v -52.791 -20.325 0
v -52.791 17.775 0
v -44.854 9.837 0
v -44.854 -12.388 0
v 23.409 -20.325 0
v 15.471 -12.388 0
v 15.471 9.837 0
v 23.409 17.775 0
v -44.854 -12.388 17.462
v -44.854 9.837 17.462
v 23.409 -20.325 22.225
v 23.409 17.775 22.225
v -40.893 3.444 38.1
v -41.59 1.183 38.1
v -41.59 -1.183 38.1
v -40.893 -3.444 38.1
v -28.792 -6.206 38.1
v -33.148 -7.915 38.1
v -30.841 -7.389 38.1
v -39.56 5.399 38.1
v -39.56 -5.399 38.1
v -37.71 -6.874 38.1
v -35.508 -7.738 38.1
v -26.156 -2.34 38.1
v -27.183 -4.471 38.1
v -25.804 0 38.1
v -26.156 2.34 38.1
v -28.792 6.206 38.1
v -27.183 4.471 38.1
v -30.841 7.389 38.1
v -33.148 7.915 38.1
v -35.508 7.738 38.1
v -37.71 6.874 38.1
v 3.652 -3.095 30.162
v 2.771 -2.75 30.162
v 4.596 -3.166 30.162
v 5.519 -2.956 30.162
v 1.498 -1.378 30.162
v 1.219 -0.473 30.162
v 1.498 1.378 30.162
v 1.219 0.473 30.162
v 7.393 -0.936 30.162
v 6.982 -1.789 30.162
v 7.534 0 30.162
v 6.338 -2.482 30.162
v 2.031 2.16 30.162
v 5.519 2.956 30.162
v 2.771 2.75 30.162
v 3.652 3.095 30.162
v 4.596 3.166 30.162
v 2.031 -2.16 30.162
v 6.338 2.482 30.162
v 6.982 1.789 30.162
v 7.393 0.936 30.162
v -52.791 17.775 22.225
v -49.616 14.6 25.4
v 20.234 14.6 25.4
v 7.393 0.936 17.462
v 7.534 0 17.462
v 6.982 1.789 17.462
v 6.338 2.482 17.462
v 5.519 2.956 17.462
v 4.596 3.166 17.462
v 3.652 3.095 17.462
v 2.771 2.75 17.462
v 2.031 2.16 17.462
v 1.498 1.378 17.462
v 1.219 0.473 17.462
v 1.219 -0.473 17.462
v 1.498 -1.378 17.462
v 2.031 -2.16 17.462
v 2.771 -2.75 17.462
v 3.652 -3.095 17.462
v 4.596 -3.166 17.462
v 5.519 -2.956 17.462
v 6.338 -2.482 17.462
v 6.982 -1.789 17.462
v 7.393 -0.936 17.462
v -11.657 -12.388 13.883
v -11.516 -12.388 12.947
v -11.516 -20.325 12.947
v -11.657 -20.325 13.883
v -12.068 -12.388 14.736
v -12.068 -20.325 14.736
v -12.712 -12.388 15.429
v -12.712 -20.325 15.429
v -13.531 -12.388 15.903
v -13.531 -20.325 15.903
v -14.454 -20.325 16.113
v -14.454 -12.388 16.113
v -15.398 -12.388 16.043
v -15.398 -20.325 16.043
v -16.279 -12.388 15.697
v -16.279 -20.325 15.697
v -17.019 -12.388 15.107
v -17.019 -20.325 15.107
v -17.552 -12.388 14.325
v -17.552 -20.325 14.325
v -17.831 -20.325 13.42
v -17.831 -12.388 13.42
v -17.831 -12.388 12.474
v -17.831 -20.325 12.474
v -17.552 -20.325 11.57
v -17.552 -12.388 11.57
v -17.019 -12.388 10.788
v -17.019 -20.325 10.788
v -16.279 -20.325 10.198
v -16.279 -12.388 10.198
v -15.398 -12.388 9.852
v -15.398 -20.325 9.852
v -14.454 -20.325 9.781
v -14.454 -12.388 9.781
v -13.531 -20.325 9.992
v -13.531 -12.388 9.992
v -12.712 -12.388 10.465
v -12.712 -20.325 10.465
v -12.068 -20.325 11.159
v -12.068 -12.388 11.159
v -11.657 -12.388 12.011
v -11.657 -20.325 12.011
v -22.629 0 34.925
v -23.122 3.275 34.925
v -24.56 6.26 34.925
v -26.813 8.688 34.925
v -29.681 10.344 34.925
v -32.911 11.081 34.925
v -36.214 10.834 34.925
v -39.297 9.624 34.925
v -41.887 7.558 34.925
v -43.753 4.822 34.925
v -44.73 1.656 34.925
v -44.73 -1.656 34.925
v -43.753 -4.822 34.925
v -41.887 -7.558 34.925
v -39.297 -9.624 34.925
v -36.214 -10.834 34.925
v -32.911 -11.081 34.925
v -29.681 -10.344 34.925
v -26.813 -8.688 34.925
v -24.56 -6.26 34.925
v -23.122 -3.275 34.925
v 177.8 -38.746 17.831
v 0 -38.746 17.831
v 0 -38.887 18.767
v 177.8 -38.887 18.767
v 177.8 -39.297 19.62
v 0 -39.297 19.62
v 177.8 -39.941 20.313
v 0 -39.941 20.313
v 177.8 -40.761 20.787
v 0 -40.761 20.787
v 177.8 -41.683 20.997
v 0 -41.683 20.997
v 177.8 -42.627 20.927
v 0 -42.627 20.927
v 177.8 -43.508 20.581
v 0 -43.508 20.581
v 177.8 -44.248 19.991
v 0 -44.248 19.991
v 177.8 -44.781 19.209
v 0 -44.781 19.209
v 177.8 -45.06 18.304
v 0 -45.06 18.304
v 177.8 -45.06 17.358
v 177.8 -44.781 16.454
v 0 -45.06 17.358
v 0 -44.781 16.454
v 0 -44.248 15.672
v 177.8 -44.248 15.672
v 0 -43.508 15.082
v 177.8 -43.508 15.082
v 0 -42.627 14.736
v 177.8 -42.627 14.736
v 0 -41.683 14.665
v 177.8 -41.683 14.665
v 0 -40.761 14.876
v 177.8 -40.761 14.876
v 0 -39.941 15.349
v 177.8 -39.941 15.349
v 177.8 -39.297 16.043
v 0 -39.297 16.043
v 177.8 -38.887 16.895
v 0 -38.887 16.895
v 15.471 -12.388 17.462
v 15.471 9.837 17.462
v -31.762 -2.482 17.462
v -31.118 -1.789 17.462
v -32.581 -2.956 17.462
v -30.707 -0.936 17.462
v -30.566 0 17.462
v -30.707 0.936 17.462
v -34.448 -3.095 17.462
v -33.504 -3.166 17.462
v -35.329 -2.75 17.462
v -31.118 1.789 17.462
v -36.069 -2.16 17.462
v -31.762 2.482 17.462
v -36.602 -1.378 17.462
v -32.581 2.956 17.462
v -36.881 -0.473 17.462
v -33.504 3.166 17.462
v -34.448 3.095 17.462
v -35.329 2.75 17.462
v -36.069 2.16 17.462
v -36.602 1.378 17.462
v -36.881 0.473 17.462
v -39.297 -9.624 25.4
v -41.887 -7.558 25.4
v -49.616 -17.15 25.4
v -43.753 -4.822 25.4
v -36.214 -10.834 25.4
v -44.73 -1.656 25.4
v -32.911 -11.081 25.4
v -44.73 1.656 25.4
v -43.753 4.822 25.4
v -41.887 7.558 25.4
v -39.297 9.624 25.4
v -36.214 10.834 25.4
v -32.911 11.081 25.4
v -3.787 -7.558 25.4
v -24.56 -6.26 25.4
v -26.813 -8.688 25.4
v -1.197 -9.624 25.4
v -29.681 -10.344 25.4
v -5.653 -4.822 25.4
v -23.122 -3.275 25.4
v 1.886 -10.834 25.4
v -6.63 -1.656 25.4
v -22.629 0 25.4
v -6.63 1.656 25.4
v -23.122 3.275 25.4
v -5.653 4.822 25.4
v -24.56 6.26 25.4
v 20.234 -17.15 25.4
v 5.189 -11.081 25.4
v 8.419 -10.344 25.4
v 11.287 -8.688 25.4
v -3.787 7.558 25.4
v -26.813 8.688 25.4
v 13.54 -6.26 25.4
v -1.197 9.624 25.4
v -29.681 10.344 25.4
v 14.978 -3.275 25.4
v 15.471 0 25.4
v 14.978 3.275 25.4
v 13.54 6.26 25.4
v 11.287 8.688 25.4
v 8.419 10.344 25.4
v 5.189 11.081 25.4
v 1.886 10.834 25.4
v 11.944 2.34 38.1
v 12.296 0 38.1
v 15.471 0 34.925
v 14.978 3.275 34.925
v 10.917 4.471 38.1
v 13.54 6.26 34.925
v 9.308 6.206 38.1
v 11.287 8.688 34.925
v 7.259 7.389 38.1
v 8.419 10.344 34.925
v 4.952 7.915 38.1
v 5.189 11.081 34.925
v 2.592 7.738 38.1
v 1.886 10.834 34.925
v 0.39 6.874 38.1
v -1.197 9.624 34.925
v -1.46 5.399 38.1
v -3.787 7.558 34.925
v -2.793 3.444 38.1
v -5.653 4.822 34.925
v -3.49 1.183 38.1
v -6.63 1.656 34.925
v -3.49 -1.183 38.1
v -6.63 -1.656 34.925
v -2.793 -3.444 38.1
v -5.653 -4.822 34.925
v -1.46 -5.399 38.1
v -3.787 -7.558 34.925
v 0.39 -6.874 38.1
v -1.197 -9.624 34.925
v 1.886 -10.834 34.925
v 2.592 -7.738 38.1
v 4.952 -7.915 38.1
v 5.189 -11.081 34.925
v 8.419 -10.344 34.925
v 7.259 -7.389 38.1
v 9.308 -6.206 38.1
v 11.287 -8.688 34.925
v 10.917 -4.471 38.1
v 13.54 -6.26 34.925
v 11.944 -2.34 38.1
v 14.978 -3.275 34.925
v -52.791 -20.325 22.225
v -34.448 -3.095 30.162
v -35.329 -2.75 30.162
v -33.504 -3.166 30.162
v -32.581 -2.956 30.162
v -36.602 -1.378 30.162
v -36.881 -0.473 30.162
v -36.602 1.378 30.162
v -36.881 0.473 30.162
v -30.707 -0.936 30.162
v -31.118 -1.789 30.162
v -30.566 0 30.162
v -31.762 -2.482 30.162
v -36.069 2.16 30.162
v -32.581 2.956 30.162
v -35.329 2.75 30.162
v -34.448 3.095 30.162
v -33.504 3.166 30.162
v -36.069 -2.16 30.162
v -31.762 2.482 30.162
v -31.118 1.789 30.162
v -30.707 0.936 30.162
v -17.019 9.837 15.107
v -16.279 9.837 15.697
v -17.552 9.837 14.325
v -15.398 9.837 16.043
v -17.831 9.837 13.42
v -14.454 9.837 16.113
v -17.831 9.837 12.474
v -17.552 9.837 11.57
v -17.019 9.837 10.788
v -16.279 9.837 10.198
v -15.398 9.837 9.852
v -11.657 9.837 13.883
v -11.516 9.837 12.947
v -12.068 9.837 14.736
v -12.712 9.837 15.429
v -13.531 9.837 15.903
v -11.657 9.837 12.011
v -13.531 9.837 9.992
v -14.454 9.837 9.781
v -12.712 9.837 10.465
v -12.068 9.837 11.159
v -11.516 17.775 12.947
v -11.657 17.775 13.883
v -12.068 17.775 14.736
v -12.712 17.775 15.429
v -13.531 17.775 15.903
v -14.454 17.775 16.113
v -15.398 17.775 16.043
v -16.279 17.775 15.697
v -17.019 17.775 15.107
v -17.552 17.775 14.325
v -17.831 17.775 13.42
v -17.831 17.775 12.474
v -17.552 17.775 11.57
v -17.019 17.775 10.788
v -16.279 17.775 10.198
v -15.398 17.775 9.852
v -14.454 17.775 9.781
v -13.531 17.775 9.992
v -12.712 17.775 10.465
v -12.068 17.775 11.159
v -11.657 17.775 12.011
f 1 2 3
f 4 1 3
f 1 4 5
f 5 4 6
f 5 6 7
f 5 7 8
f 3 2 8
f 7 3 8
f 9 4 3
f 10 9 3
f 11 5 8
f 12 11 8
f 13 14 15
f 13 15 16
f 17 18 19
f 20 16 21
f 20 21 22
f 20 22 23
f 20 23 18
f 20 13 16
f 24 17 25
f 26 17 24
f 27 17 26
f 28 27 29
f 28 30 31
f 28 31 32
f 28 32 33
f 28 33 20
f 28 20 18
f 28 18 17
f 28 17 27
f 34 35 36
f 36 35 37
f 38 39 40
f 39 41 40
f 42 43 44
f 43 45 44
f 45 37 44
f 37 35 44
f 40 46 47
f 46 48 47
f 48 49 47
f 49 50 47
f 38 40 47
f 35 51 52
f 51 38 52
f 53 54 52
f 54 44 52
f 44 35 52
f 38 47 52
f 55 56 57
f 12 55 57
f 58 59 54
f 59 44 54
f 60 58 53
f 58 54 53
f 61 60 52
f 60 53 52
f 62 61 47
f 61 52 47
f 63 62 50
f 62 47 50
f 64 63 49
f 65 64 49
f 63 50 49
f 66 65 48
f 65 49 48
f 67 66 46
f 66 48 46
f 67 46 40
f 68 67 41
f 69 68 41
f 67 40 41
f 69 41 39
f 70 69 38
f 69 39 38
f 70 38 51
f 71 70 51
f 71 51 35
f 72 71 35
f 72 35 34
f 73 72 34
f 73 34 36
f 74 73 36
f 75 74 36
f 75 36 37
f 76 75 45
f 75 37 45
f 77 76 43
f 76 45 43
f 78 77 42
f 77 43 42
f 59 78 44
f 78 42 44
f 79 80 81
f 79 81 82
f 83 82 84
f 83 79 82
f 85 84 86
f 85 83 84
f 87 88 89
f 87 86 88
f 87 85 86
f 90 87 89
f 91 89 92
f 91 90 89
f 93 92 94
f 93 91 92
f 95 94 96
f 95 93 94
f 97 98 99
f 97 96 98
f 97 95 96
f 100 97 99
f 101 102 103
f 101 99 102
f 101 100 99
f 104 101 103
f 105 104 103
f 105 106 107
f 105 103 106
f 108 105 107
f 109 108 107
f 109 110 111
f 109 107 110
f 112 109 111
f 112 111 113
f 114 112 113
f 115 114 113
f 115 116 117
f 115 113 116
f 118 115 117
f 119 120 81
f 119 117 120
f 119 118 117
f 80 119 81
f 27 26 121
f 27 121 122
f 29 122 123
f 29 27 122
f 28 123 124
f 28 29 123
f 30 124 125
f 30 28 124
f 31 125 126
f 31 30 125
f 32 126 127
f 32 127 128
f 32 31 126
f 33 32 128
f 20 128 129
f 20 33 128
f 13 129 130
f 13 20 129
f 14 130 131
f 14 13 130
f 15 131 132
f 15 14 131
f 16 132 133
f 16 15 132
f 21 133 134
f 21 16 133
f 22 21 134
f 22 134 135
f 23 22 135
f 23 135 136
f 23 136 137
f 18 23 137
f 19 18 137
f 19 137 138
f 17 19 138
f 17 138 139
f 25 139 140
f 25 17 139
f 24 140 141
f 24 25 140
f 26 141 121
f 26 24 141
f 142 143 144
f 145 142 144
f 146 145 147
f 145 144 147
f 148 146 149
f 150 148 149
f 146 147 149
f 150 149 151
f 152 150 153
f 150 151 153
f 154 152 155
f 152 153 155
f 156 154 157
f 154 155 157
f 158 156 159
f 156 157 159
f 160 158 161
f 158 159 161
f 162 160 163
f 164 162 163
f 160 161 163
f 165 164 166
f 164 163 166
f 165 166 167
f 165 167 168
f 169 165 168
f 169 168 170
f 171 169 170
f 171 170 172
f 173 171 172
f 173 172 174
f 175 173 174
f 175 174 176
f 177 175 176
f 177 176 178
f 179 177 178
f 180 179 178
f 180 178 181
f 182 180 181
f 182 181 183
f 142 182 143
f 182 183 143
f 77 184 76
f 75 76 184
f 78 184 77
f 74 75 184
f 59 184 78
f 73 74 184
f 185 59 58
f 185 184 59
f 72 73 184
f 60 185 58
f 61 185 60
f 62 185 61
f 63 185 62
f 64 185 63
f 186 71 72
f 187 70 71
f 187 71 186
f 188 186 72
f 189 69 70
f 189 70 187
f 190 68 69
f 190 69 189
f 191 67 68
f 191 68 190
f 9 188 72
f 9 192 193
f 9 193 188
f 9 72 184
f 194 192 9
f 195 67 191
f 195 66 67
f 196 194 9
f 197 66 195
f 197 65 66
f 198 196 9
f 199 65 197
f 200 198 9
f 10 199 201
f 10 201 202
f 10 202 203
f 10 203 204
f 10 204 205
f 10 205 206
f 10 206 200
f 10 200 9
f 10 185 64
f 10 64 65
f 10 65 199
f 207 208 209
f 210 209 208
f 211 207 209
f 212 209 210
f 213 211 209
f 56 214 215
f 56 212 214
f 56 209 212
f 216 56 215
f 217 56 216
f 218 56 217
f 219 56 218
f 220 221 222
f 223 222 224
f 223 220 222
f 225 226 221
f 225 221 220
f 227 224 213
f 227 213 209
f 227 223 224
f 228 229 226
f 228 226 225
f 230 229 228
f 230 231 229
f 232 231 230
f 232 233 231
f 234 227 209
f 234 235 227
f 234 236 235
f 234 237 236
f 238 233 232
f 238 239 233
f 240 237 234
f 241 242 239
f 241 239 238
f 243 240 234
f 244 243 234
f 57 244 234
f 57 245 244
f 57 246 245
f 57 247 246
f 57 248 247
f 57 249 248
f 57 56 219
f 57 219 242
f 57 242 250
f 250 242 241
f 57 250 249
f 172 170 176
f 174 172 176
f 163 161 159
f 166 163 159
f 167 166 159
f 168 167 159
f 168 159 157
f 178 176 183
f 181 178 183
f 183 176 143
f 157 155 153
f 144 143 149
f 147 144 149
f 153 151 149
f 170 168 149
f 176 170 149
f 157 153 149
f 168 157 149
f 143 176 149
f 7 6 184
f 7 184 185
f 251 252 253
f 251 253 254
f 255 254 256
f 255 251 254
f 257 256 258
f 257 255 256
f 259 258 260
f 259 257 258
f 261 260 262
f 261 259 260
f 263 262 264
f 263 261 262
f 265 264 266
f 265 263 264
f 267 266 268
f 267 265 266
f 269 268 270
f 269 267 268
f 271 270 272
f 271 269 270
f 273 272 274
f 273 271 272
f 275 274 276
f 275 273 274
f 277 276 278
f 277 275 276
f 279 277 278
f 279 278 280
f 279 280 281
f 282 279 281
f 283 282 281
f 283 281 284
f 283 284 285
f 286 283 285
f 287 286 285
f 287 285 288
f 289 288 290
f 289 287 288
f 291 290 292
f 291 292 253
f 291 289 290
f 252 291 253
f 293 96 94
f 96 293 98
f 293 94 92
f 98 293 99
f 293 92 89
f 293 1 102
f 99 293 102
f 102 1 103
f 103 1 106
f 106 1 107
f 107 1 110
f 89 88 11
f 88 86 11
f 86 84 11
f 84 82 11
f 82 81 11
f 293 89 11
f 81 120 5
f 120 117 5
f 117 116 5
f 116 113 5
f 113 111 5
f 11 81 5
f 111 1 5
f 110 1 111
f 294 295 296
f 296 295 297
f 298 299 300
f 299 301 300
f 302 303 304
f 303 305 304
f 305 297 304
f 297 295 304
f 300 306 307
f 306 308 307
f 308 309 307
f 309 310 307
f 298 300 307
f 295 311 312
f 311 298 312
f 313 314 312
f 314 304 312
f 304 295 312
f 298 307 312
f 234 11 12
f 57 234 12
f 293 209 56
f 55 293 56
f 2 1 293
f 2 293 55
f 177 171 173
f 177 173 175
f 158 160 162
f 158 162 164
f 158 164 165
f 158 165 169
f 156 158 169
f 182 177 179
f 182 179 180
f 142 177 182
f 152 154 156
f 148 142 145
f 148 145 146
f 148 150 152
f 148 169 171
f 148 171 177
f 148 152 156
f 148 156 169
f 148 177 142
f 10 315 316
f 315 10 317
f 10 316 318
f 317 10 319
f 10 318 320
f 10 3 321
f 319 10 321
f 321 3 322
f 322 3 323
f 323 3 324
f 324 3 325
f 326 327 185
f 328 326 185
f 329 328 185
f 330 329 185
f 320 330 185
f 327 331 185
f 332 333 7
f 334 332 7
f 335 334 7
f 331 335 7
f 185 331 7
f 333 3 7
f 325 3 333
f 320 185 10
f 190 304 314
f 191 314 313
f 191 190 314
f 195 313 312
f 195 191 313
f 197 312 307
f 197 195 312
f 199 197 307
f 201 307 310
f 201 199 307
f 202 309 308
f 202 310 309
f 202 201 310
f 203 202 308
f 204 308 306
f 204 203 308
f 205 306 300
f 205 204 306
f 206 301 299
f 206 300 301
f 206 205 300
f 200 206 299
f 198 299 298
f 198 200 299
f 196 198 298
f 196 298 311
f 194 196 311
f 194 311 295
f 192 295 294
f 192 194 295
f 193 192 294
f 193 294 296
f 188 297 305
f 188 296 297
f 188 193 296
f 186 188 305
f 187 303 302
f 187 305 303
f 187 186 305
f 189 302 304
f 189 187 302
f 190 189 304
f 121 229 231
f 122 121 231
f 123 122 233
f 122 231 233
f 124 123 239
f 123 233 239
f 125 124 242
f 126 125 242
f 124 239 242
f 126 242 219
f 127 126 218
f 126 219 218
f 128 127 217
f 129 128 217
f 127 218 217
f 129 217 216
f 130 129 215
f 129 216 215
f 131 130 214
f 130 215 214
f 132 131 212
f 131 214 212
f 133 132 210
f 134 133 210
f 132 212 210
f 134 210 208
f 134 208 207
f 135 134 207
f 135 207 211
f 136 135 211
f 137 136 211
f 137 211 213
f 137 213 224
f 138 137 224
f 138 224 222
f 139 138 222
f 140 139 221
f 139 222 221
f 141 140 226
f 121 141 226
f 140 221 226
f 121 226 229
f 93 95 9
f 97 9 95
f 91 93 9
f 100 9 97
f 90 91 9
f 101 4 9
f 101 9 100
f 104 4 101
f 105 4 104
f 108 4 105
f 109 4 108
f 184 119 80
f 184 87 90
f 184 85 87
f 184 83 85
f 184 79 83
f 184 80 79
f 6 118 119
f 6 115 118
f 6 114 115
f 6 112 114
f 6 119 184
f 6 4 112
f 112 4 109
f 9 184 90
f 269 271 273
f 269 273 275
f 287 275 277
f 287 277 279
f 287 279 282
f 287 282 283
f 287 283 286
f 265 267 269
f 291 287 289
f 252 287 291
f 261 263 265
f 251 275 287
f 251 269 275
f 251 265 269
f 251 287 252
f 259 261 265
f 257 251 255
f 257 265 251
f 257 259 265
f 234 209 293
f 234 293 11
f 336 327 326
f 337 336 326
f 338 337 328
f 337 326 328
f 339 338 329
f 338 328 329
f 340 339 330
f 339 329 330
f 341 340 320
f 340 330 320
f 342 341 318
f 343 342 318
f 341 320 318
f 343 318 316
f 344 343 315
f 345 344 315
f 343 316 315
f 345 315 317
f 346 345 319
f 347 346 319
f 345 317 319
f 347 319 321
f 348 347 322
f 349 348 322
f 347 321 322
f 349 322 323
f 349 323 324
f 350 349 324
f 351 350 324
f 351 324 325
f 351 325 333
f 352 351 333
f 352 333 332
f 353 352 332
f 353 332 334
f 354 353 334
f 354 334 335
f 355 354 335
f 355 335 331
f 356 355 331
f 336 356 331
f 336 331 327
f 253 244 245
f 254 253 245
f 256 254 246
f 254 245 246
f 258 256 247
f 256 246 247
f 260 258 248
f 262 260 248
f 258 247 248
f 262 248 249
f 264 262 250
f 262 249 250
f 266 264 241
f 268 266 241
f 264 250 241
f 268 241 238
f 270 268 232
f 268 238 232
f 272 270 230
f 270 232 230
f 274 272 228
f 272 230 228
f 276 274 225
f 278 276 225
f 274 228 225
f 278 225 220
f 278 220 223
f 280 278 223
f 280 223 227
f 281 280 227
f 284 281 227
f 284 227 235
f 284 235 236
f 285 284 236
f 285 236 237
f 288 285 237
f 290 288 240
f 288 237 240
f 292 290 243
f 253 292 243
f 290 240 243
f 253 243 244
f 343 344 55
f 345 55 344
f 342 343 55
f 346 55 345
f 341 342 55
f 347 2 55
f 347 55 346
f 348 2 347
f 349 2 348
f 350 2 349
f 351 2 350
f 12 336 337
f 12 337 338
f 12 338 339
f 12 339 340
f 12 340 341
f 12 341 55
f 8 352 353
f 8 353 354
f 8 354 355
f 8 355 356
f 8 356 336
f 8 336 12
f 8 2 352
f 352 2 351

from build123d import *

# Parameters (mm, degrees)
F0_W          = 76.2
F0_H          = 38.1
F1_DEPTH      = 25.4
F2_R          = 11.1125
F3_DEPTH      = 12.7
F4_SIZE2      = 3.175
F4_SIZE       = 3.175
F5_SIZE       = 3.175
F6_T          = 7.9375
F7_R          = 3.175
F8_DEPTH      = 20.3260867754
F8_DEPTH_BACK = 17.7759132246
F9_R          = 3.175
F10_DEPTH     = 177.8


# Not quite as in the source:
# - a shell that OpenCascade refuses in one call is made with other operations: the cavity is built on its own and cut out


with BuildPart() as f1:
    # F0 (on Top) → F1 (new body)
    with BuildSketch(Plane.XY):
        with Locations((-14.6912483396, -1.2750867754)):
            Rectangle(F0_W, F0_H)
    extrude(amount=F1_DEPTH)

    # F2 (on face) → F3 (join)
    with BuildSketch(Plane.XY.offset(25.4)):
        with Locations((-33.7412483396, 0)):
            Circle(F2_R)
        with Locations((4.3587516604, 0)):
            Circle(F2_R)
    extrude(amount=F3_DEPTH)

    # F4
    f4_edges = [f1.edges().sort_by_distance(p)[0] for p in [
        (-14.691248, -20.325087, 25.4),
        (-52.791248, -1.275087, 25.4),
        (-14.691248, 17.774913, 25.4),
        (23.408752, -1.275087, 25.4),
    ]]
    chamfer(f4_edges, length=F4_SIZE, length2=F4_SIZE2)

    # F5
    f5_edges = [f1.edges().sort_by_distance(p)[0] for p in [
        (-44.853748, 0, 38.1),
        (-6.753748, 0, 38.1),
    ]]
    chamfer(f5_edges, length=F5_SIZE)

    # F6: shell of thickness 7.9375, made by hand


with BuildPart() as f6_core1:
    # F6_t2: copy of F1
    add(f1.part)

    # the walls: a layer under each face that stays
    f6_faces = [f6_core1.faces().sort_by_distance(p)[0] for p in [
        (-44.8537483396, 0, 30.1625),
        (-43.2662483396, 0, 36.5125),
        (-14.6912483396, -1.2750867754, 25.4),
        (-33.7412483396, 0, 38.1),
        (-14.6912483396, -18.7375867754, 23.8125),
        (-51.2037483396, -1.2750867754, 23.8125),
        (21.8212516604, -1.2750867754, 23.8125),
        (-14.6912483396, 16.1874132246, 23.8125),
        (-6.7537483396, 0, 30.1625),
        (-14.6912483396, -20.3250867754, 11.1125),
        (-52.7912483396, -1.2750867754, 11.1125),
        (23.4087516604, -1.2750867754, 11.1125),
        (-14.6912483396, 17.7749132246, 11.1125),
        (-5.1662483396, 0, 36.5125),
        (4.3587516604, 0, 38.1),
    ]]
    thicken(f6_faces, amount=-F6_T, mode=Mode.SUBTRACT)

    # F6_s3 → F6_t4 (revolve, cut)
    with BuildSketch(Plane.XZ):
        Polygon((-22.5493733396, 25.479375), (-30.5662483396, 25.4), (-30.5662483396, 17.4625), (-22.6287483396, 17.4625), align=None)
    revolve(axis=Axis((-33.7412483396, 0, 25.4), (0, 0, 1)), mode=Mode.SUBTRACT)

    # F6_s5 → F6_t6 (revolve, cut)
    with BuildSketch(Plane.XZ):
        Polygon((15.5506266604, 25.479375), (15.4712516604, 17.4625), (7.5337516604, 17.4625), (7.5337516604, 25.4), align=None)
    revolve(axis=Axis((4.3587516604, 0, 25.4), (0, 0, 1)), mode=Mode.SUBTRACT)


with BuildPart() as f1_1:
    add(f1.part)

    # what is left inside the walls is the cavity
    f6_cavity = [f6_core1.part.solids().sort_by_distance(p)[0] for p in [
        (-14.691248, -4.979253, 0.079375),
    ]]
    add(f6_cavity, mode=Mode.SUBTRACT)

    # F7 (on Front) → F8 (cut, two sides)
    with BuildSketch(Plane.XZ) as f8_sk:
        with Locations((-14.6912483396, 12.9471793771)):
            Circle(F7_R)
    extrude(amount=F8_DEPTH, mode=Mode.SUBTRACT)
    extrude(f8_sk.sketch, amount=-F8_DEPTH_BACK, mode=Mode.SUBTRACT)


with BuildPart() as f10:
    # F9 (on Right) → F10 (new body)
    with BuildSketch(Plane.YZ):
        with Locations((-41.9206805527, 17.8311616182)):
            Circle(F9_R)
    extrude(amount=F10_DEPTH)


solid = Compound([f1_1.part, f10.part])
